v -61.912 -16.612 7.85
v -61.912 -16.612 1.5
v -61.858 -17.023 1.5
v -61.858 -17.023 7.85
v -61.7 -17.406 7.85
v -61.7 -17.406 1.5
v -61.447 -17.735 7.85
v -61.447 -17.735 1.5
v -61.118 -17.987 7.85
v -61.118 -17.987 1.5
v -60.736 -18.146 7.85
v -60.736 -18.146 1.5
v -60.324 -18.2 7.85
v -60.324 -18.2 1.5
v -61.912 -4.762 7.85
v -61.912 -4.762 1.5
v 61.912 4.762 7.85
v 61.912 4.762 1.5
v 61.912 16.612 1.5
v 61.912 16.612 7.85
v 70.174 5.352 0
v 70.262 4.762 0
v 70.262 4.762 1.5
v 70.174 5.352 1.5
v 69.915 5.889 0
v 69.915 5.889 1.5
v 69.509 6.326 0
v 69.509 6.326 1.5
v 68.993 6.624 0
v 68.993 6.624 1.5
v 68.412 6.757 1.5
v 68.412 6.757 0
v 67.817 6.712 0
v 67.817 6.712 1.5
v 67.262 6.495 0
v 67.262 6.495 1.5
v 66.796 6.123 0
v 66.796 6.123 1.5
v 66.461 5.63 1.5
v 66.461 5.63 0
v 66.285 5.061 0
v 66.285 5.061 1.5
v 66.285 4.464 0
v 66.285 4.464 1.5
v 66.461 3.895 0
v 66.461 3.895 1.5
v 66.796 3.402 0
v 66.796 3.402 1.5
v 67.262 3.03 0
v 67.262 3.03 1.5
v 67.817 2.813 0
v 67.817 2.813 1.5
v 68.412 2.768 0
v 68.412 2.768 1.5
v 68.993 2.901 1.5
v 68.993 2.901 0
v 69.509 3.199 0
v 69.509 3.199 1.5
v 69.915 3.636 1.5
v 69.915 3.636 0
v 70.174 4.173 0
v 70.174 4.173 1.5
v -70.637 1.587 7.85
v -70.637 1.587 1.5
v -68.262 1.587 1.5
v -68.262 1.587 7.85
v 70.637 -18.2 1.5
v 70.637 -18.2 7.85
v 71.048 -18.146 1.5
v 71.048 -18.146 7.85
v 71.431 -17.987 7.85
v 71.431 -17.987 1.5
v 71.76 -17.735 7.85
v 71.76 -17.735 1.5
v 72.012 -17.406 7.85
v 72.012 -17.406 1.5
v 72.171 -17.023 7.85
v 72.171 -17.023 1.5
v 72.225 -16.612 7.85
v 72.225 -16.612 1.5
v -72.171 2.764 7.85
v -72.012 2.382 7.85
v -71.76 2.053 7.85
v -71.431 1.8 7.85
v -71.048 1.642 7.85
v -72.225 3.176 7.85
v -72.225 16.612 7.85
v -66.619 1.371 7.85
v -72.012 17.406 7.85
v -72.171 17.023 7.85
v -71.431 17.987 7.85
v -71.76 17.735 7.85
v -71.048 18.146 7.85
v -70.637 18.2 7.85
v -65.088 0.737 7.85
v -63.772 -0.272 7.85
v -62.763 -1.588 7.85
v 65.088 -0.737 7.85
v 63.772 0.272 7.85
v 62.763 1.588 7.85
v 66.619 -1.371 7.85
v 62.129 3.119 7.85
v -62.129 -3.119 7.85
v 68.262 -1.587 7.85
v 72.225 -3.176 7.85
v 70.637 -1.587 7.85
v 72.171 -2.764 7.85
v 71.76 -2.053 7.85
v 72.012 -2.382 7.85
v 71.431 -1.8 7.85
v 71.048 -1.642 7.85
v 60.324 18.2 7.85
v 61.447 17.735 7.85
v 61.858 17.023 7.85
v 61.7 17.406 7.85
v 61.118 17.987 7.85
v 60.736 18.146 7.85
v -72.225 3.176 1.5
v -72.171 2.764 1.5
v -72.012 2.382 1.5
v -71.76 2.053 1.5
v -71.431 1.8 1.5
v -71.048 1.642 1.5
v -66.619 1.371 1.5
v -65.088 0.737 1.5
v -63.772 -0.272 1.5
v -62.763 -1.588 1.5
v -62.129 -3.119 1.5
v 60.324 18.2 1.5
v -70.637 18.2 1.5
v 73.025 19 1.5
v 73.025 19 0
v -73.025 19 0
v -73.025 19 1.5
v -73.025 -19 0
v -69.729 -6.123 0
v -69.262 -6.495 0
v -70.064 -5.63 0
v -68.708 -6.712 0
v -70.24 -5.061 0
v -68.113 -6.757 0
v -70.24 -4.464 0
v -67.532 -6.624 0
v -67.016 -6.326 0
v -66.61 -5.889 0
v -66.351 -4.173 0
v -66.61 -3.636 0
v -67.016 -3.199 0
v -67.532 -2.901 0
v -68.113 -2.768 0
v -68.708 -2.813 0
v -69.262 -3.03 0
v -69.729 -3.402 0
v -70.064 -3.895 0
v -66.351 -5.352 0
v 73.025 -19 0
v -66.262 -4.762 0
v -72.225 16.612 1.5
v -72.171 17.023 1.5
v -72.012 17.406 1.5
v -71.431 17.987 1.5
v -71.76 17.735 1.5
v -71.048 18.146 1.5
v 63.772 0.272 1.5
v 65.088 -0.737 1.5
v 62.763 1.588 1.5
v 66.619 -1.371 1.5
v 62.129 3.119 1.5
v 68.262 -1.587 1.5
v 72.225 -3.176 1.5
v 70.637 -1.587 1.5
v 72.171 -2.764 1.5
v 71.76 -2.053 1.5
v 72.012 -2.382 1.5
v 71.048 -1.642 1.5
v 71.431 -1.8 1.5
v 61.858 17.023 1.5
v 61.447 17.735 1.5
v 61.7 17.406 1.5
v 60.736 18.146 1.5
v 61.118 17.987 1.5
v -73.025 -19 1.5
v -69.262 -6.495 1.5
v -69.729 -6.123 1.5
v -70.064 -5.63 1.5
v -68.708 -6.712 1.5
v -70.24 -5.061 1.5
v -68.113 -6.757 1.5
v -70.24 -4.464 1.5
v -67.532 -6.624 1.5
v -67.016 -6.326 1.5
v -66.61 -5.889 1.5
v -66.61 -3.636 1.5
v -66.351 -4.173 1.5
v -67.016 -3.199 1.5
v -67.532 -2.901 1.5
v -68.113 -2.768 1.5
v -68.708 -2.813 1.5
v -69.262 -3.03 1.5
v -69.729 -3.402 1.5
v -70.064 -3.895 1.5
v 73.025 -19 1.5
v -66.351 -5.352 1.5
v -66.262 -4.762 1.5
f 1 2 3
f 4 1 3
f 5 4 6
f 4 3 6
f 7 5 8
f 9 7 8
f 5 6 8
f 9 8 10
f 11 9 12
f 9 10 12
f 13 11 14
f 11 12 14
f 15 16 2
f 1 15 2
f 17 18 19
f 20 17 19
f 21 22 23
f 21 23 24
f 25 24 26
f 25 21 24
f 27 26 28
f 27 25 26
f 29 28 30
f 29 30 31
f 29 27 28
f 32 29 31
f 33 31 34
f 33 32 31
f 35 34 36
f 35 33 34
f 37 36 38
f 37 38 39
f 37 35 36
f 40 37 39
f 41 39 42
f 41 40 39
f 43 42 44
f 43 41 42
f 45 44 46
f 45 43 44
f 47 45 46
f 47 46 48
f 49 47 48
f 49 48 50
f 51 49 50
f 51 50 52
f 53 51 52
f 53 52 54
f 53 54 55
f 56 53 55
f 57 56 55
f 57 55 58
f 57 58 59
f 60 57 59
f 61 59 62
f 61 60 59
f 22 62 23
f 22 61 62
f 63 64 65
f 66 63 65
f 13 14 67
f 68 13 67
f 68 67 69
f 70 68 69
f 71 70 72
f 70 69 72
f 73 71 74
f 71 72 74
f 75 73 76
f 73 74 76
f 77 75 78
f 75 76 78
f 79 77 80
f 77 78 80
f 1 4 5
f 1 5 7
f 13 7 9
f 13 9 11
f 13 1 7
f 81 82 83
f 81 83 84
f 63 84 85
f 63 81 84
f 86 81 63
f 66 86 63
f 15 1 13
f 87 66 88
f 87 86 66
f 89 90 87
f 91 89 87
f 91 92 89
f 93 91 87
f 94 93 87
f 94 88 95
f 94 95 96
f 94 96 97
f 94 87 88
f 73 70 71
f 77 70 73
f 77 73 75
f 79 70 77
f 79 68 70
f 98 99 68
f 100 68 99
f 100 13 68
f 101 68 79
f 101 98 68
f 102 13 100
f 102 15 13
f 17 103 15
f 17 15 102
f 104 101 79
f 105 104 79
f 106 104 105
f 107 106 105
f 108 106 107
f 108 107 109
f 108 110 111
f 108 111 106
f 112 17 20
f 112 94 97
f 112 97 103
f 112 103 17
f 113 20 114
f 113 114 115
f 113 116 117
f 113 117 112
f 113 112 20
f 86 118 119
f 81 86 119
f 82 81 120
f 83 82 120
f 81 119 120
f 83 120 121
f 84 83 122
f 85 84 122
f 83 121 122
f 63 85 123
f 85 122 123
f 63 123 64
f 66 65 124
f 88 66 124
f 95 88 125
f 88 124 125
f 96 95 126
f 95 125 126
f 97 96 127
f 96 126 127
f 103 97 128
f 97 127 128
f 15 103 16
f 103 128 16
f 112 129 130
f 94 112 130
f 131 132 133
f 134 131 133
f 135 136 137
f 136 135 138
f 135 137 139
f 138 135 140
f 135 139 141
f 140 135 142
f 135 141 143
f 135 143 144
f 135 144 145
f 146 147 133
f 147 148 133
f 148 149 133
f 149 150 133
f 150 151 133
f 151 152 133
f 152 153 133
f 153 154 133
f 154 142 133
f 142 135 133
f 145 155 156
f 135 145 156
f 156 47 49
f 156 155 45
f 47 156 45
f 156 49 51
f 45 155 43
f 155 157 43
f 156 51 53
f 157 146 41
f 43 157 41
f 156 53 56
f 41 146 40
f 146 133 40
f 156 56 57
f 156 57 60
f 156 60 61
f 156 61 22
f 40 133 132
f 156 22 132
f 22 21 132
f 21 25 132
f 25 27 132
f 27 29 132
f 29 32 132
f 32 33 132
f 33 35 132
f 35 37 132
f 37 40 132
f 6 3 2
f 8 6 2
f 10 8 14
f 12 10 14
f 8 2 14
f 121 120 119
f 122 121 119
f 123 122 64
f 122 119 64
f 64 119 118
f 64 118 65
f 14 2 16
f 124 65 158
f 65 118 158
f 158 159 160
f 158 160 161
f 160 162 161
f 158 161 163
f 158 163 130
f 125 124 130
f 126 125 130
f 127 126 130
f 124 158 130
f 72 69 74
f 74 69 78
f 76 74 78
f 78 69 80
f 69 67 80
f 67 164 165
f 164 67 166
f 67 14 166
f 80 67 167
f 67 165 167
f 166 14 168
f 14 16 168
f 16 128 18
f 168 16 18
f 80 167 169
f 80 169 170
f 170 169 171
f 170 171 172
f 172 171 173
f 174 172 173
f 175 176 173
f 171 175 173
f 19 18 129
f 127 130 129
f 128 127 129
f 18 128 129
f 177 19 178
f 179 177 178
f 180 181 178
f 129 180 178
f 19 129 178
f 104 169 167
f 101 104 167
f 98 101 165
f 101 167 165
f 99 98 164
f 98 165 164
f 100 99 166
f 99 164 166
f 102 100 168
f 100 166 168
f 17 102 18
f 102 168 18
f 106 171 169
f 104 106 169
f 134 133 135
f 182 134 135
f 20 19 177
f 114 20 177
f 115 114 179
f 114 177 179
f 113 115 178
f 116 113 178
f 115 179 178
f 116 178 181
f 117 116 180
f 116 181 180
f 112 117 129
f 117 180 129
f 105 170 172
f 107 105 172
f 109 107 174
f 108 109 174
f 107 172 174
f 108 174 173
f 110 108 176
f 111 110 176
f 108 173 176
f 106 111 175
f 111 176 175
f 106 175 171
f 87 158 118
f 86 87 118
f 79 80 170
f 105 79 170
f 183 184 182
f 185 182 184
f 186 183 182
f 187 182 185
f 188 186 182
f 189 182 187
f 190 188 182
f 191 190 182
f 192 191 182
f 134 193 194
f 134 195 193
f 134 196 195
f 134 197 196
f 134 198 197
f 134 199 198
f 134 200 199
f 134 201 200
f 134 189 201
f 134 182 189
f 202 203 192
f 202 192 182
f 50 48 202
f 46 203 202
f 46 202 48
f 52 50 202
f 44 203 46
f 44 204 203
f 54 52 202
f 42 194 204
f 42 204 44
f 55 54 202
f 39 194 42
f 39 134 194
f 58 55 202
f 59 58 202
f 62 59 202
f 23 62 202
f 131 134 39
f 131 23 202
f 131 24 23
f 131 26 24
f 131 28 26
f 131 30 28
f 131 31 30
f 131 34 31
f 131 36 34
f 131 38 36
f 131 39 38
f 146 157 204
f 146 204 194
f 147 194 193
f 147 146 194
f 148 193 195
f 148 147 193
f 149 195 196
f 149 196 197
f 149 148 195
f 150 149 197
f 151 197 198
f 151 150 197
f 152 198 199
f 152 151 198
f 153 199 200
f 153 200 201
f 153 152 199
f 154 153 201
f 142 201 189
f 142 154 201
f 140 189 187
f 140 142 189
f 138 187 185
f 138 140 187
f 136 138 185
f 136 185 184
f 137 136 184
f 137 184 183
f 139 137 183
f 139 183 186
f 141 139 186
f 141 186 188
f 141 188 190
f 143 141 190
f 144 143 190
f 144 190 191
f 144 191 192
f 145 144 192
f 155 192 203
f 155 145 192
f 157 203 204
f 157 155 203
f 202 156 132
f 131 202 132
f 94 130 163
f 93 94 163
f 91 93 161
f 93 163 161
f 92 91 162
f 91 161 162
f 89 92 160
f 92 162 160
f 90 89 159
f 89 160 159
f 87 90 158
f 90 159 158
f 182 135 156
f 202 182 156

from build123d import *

# Parameters (mm, degrees)
F0_R     = 2
F0_R_2   = 4.7625
F1_DEPTH = 1.5
F3_DEPTH = 6.35


# Not quite as in the source:
# - a feature names something its author has since deleted; it is built from what else it names


with BuildPart() as f1:
    # F0 (on Top) → F1 (new body)
    with BuildSketch(Plane.XY):
        with BuildLine():
            Line((-73.025, 19), (-73.025, 1.5875))
            Line((-73.025, 1.5875), (-68.2625, 1.5875))
            ThreePointArc((-68.2625, 1.5875), (-61.9125, -4.7625), (-68.2625, -11.1125))
            Line((-68.2625, -11.1125), (-73.025, -11.1125))
            Line((-73.025, -11.1125), (-73.025, -19))
            Line((-73.025, -19), (73.025, -19))
            Line((73.025, -19), (73.025, -1.5875))
            Line((73.025, -1.5875), (68.2625, -1.5875))
            ThreePointArc((68.2625, -1.5875), (61.9125, 4.7625), (68.2625, 11.1125))
            Line((68.2625, 11.1125), (73.025, 11.1125))
            Line((73.025, 11.1125), (73.025, 19))
            Line((73.025, 19), (-73.025, 19))
        make_face()
        with BuildLine():
            Line((-73.025, 1.5875), (-73.025, -4.7625))
            Line((-73.025, -4.7625), (-73.025, -11.1125))
            Line((-73.025, -11.1125), (-68.2625, -11.1125))
            ThreePointArc((-68.2625, -11.1125), (-61.9125, -4.7625), (-68.2625, 1.5875))
            Line((-68.2625, 1.5875), (-73.025, 1.5875))
        make_face()
        with BuildLine():
            ThreePointArc((-73.025, -4.7625), (-68.2625, 0), (-63.5, -4.7625))
            ThreePointArc((-63.5, -4.7625), (-68.2625, -9.525), (-73.025, -4.7625))
        make_face(mode=Mode.SUBTRACT)
        with BuildLine():
            ThreePointArc((-73.025, -4.7625), (-68.2625, -9.525), (-63.5, -4.7625))
            ThreePointArc((-63.5, -4.7625), (-68.2625, 0), (-73.025, -4.7625))
        make_face()
        with Locations((-68.2625, -4.7625)):
            Circle(F0_R, mode=Mode.SUBTRACT)
        with BuildLine():
            Line((73.025, 4.7625), (73.025, 11.1125))
            Line((73.025, 11.1125), (68.2625, 11.1125))
            ThreePointArc((68.2625, 11.1125), (61.9125, 4.7625), (68.2625, -1.5875))
            Line((68.2625, -1.5875), (73.025, -1.5875))
            Line((73.025, -1.5875), (73.025, 4.7625))
        make_face()
        with Locations((68.2625, 4.7625)):
            Circle(F0_R_2, mode=Mode.SUBTRACT)
        with Locations((68.2625, 4.7625)):
            Circle(F0_R_2)
        with Locations((68.2625, 4.7625)):
            Circle(F0_R, mode=Mode.SUBTRACT)
    extrude(amount=F1_DEPTH)


with BuildPart() as f3:
    # F2 (on face) → F3 (new body)
    with BuildSketch(Plane.XY.offset(1.5)):
        with BuildLine():
            Line((70.637, -1.5875), (68.2625, -1.5875))
            ThreePointArc((68.2625, -1.5875), (63.7723719395, 0.2723719395), (61.9125, 4.7625))
            Line((61.9125, 4.7625), (61.9125, 16.612))
            ThreePointArc((61.9125, 16.612), (61.4473855685, 17.7348855685), (60.3245, 18.2))
            Line((60.3245, 18.2), (-70.637, 18.2))
            ThreePointArc((-70.637, 18.2), (-71.7598855685, 17.7348855685), (-72.225, 16.612))
            Line((-72.225, 16.612), (-72.225, 3.1755))
            ThreePointArc((-72.225, 3.1755), (-71.7598855685, 2.0526144315), (-70.637, 1.5875))
            Line((-70.637, 1.5875), (-68.2625, 1.5875))
            ThreePointArc((-68.2625, 1.5875), (-63.7723719395, -0.2723719395), (-61.9125, -4.7625))
            Line((-61.9125, -4.7625), (-61.9125, -16.612))
            ThreePointArc((-61.9125, -16.612), (-61.4473855685, -17.7348855685), (-60.3245, -18.2))
            Line((-60.3245, -18.2), (70.637, -18.2))
            ThreePointArc((70.637, -18.2), (71.7598855685, -17.7348855685), (72.225, -16.612))
            Line((72.225, -16.612), (72.225, -3.1755))
            ThreePointArc((72.225, -3.1755), (71.7598855685, -2.0526144315), (70.637, -1.5875))
        make_face()
    extrude(amount=F3_DEPTH)


solid = Compound([f1.part, f3.part])
